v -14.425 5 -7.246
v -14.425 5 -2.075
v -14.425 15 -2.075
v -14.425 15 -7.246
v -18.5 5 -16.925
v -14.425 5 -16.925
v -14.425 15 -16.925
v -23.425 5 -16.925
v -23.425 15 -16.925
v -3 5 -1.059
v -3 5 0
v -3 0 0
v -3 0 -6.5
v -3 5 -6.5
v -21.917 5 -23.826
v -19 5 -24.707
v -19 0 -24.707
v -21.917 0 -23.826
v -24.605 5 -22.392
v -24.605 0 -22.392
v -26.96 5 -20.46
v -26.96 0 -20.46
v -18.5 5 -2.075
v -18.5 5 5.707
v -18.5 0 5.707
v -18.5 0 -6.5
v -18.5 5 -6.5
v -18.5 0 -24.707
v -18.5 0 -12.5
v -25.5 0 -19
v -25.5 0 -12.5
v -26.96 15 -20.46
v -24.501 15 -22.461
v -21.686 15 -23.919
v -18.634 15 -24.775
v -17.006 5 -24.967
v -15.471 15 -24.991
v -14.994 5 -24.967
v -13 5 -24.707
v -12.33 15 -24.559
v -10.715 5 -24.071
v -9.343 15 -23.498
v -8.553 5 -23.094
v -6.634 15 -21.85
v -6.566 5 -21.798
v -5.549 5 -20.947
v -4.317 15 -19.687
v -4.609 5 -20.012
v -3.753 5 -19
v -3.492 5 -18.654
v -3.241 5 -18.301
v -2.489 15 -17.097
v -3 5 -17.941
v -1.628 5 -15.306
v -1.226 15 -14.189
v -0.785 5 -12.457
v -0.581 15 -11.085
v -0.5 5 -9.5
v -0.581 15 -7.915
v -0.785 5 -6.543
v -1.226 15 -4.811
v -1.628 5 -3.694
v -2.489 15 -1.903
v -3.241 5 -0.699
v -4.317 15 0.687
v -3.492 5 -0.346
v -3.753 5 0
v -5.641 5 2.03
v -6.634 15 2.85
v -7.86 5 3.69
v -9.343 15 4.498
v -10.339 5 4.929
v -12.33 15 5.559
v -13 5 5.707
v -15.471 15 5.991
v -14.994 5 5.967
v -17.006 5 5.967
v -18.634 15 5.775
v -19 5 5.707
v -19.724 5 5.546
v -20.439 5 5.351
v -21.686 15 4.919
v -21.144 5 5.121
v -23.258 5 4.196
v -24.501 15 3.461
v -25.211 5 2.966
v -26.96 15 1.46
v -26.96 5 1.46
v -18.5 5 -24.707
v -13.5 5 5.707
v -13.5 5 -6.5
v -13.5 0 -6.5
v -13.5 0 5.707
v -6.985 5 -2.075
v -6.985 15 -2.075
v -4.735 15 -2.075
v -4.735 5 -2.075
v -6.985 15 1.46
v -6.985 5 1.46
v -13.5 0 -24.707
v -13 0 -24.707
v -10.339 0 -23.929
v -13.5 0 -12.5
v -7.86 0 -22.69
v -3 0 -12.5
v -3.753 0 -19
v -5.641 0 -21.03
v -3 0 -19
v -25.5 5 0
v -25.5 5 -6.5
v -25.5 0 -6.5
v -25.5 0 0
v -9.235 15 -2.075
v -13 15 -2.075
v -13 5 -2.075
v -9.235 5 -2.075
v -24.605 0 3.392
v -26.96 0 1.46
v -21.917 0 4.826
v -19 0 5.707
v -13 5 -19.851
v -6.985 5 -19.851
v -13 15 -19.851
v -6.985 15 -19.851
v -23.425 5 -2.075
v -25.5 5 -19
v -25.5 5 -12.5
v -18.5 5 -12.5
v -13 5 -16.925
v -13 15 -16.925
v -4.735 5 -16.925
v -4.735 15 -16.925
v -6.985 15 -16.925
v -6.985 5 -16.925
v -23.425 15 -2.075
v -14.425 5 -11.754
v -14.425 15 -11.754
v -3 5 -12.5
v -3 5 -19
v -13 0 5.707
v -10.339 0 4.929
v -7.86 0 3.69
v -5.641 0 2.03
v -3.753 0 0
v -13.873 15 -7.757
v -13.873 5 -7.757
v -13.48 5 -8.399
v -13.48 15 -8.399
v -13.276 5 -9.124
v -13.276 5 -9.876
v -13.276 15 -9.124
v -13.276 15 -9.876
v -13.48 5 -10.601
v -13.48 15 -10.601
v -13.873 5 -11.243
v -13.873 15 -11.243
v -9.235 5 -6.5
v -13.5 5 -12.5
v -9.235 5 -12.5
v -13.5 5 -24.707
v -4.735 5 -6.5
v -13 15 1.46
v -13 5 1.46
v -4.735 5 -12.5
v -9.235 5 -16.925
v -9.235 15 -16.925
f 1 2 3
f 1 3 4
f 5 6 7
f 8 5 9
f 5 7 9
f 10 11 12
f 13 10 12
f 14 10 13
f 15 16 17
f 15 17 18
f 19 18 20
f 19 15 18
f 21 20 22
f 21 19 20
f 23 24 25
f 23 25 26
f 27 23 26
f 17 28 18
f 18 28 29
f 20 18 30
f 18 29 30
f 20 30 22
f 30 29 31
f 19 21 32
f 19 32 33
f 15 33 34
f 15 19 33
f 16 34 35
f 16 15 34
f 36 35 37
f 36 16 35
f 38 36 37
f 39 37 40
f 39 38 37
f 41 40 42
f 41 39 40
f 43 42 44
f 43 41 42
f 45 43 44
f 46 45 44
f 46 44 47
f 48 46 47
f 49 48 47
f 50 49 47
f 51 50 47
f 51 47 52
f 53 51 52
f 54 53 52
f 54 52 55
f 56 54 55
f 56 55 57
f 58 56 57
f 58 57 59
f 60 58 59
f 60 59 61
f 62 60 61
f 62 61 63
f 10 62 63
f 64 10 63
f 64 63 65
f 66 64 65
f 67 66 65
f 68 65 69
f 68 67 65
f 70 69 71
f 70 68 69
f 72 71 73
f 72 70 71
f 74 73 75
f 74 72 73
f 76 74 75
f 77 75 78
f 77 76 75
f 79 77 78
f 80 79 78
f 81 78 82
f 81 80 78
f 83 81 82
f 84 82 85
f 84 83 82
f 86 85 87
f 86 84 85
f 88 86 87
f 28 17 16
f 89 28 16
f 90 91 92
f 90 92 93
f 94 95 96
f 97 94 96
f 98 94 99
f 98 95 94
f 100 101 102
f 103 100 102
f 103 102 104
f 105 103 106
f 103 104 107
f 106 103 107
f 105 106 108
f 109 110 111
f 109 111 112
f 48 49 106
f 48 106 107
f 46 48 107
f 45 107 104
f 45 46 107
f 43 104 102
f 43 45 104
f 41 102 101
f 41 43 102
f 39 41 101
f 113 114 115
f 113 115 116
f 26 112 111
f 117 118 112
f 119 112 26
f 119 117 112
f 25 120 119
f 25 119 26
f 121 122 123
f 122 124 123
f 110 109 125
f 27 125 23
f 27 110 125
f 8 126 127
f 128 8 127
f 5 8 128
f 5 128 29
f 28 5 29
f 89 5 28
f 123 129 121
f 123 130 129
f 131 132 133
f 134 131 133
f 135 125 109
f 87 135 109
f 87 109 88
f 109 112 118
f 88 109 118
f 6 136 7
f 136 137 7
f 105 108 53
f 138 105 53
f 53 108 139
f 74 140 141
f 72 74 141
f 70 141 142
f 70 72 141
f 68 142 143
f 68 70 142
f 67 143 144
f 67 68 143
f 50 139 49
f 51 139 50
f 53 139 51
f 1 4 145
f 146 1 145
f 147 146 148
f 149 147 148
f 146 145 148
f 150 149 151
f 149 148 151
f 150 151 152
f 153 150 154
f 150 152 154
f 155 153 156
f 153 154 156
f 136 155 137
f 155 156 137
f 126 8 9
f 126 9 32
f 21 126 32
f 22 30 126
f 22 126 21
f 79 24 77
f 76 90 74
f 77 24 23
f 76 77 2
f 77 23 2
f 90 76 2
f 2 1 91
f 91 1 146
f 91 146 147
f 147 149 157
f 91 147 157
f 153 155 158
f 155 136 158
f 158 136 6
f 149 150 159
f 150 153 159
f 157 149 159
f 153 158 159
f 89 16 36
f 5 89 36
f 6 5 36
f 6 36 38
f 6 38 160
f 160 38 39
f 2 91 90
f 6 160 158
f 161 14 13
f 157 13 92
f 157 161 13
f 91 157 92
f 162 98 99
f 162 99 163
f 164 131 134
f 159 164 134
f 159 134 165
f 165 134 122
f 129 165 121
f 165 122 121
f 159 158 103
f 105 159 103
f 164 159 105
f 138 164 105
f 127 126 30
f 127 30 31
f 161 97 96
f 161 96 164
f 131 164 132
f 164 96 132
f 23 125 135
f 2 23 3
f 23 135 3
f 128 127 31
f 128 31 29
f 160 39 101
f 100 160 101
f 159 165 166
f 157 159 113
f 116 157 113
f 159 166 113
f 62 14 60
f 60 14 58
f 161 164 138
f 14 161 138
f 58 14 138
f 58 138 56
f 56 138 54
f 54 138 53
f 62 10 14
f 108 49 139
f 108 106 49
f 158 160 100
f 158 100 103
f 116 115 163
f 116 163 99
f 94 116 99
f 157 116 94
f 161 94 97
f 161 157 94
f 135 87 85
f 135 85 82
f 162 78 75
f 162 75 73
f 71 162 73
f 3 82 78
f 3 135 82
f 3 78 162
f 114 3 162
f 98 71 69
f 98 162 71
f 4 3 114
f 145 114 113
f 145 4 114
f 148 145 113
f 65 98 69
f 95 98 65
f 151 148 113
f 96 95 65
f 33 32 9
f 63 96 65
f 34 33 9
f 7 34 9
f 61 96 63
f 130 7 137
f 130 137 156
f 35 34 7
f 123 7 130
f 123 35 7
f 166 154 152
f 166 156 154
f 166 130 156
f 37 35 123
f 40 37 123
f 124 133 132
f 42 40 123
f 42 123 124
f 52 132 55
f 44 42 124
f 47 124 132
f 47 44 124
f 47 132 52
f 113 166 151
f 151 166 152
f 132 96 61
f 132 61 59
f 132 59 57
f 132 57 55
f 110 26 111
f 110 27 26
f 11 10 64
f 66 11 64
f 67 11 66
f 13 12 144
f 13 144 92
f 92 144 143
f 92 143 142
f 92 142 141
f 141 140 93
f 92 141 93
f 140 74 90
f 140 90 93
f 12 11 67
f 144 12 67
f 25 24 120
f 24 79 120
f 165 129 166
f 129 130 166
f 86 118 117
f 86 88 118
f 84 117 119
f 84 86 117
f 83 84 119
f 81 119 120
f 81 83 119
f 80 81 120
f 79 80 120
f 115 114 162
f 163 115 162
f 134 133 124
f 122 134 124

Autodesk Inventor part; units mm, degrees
ref_plane "YZ Plane" through (0, 0, 0) normal (1, 0, 0) x (0, 1, 0)
ref_plane "XZ Plane" through (0, 0, 0) normal (0, 1, 0) x (-1, 0, 0)
ref_plane "XY Plane" through (0, 0, 0) normal (0, 0, 1) x (1, 0, 0)
sketch "Sketch5" plane through (0, 0, 0) normal (0, 1, 0) x (-1, 0, 0)
  line L0 (0, 0) -> (32, 0)
  line L1 (32, 0) -> (32, -19)
  line L2 (32, -19) -> (0, -19)
  line L3 (0, -19) -> (0, 0)
  line L4 (32, -19) -> (19, -19)
  line L5 (19, -19) -> (19, 0)
  line L6 (19, 0) -> (32, 0)
  line L7 (32, 0) -> (32, -19)
  line L8 (0, 0) -> (13, 0)
  line L9 (13, 0) -> (13, -19)
  line L10 (13, -19) -> (0, -19)
  line L11 (0, -19) -> (0, 0)
  line L12 (0, 0) -> (32, 0)
  line L13 (32, 0) -> (32, -6.75)
  line L14 (32, -6.75) -> (0, -6.75)
  line L15 (0, -6.75) -> (0, 0)
  line L16 (0, -19) -> (32, -19)
  line L17 (32, -19) -> (32, -12.25)
  line L18 (32, -12.25) -> (0, -12.25)
  line L19 (0, -12.25) -> (0, -19)
  circle A0 centre (16, -9.5) radius 4
  circle A1 centre (16, -9.5) radius 1
  line L20 (13, 0) -> (19, 0)
  line L21 (19, 0) -> (19, -19)
  line L22 (19, -19) -> (13, -19)
  line L23 (13, -19) -> (13, 0)
  point P0 (13, -12.1458)
  point P1 (13.0953, -12.25)
  point P2 (0, -12.25)
  point P3 (13, -19)
  point P4 (13.0953, -6.75)
  point P5 (13, -6.8542)
  point P6 (19, -6.8542)
  point P7 (18.9047, -6.75)
  point P8 (19, 0)
  point P9 (18.9047, -12.25)
  point P10 (19, -12.1458)
  point P11 (13, -12.25)
  point P12 (13, -6.75)
  point P13 (19, -6.75)
  point P14 (19, -12.25)
  dimension "d13" = 32
  dimension "d14" = 19
  dimension "d15" = 13
  dimension "d16" = 19
  dimension "d17" = 13
  dimension "d18" = 19
  dimension "d19" = 32
  dimension "d20" = 6.75
  dimension "d21" = 32
  dimension "d22" = 6.75
  dimension "d23" = 8
  dimension "d24" = 2
extrude "Extrusion2" add sketch "Sketch5" along normal blind 5 contours L0 L9 L14 L3 | L0 L5 L14 A0 L9 | L14 L9 A0 L18 L3 | L0 L1 L14 L5 | L14 A0 L9 | L18 L9 L2 L3 | L14 L1 L18 L5 A0 | L5 A0 L14 | L9 A0 | A0 L14 | L18 A0 L5 L2 L9 | L9 A0 L18 | A0 L5 | L18 A0 | L1 L2 L5 L18 | L5 L18 A0
sketch "Sketch6" plane through (0, 5, 0) normal (0, 1, 0) x (1, 0, 0)
  arc A0 (-18.9047, 6.75) -> (-19, 6.8542) centre (-16, 9.5) ccw projected
  circle A1 centre (-16, 9.5) radius 15.5
  line L0 (-16, 9.5) -> (-26.9602, 20.4602)
  line L1 (-16, 9.5) -> (-0.5, 9.5) construction
  line L2 (-16, 9.5) -> (-26.9602, -1.4602)
  line L3 (-16, 9.5) -> (-0.5, 9.5) construction
  line L4 (-26.9602, -1.4602) -> (-19.8891, 5.6109)
  line L5 (-19.8891, 5.6109) -> (-19.8891, 13.3891)
  circle A2 centre (-16, 9.5) radius 1
  point P0 (0, 0)
  dimension "d27" = 31
  dimension "d28" = 135
  dimension "d29" = 135
  dimension "d30" = 10
  dimension "d33" = 2
extrude "Extrusion3" add sketch "Sketch6" along normal blind 10 contours L2 A2 L0 A0 | L2 L5 A0 L0 A2 | A0 L0 A1 L2 | A0 L5 L0
sketch "Sketch7" plane through (0, 15, 0) normal (0, 1, 0) x (1, 0, 0)
  circle A0 centre (-16, 9.5) radius 1 projected
  circle A1 centre (-16, 9.5) radius 2.75
  point P0 (0, 0)
  dimension "d34" = 5.5
extrude "Extrusion4" cut sketch "Sketch7" against normal blind 10
sketch "Sketch8" plane through (0, 0, 0) normal (0, -1, 0) x (1, 0, 0)
  point P0 (0, 0)
sketch "Sketch9" plane through (0, 0, 0) normal (0, -1, 0) x (1, 0, 0)
  arc A0 (-3.7526, -19) -> (-3.7526, 0) centre (-16, -9.5) ccw projected
  point P0 (0, 0)
sketch "Sketch10" plane through (0, 0, 0) normal (0, -1, 0) x (1, 0, 0)
  line L0 (-32, 0) -> (-25.5, 0) projected
  line L1 (-32, 0) -> (-19, 0)
  line L2 (-19, 0) -> (-19, -6)
  line L3 (-19, -6) -> (-32, -6)
  line L4 (-32, -6) -> (-32, 0)
  line L5 (-32, -19) -> (-32, 0) projected
  line L6 (-32, -19) -> (-19, -19)
  line L7 (-19, -19) -> (-19, -13)
  line L8 (-19, -13) -> (-32, -13)
  line L9 (-32, -13) -> (-32, -19)
  line L10 (0, 0) -> (-13, 0)
  line L11 (-13, 0) -> (-13, -6)
  line L12 (-13, -6) -> (0, -6)
  line L13 (0, -6) -> (0, 0)
  line L14 (0, -19) -> (-3.7526, -19) projected
  line L15 (0, -19) -> (-13, -19)
  line L16 (-13, -19) -> (-13, -13)
  line L17 (-13, -13) -> (0, -13)
  line L18 (0, -13) -> (0, -19)
  line L19 (-19, -6) -> (-13, -6)
  line L20 (-13, -6) -> (-13, -13)
  line L21 (-13, -13) -> (-19, -13)
  line L22 (-19, -13) -> (-19, -6)
  line L23 (-19, 0) -> (-13, 0)
  line L24 (-13, 0) -> (-13, -6)
  line L25 (-13, -6) -> (-19, -6)
  line L26 (-19, -6) -> (-19, 0)
  line L27 (-13, -13) -> (-19, -13)
  line L28 (-19, -13) -> (-19, -19)
  line L29 (-19, -19) -> (-13, -19)
  line L30 (-13, -19) -> (-13, -13)
  line L31 (-32, -13) -> (-19, -13)
  line L32 (-19, -13) -> (-19, -6)
  line L33 (-19, -6) -> (-32, -6)
  line L34 (-32, -6) -> (-32, -13)
  line L35 (-13, -6) -> (0, -6)
  line L36 (0, -6) -> (0, -13)
  line L37 (0, -13) -> (-13, -13)
  line L38 (-13, -13) -> (-13, -6)
  point P0 (0, -6)
  dimension "d37" = 13
  dimension "d38" = 6
  dimension "d39" = 6
  dimension "d40" = 13
  dimension "d41" = 6
  dimension "d42" = 13
  dimension "d43" = 6
extrude "Extrusion5" cut sketch "Sketch10" against normal blind 5 contours L3 L22 L8 L5 | L23 L11 L19 L2 | L19 L20 L21 L22 | L12 L36 L17 L20 | L21 L16 L29 L7
sketch "Sketch11" plane through (0, 5, 0) normal (0, -1, 0) x (1, 0, 0)
  arc A0 (-3.7526, 0) -> (-26.9602, 1.4602) centre (-16, -9.5) ccw projected
  arc A1 (-26.9602, -20.4602) -> (-3.7526, -19) centre (-16, -9.5) ccw projected
  line L0 (-25.5, 0) -> (-26.9602, 1.4602) projected
  line L1 (-26.9602, -20.4602) -> (-25.5, -19) projected
  line L2 (-13, 0) -> (-3.7526, 0) projected
  line L3 (-19, -13) -> (-19.8891, -13) projected
  line L4 (-13, -13) -> (-13, -19) projected
  line L5 (-25.5, 0) -> (-19, 0) projected
  line L6 (-25.5, 0) -> (-3.7526, 0)
  line L7 (-19, -19) -> (-32, -19) projected
  line L8 (-19, -19) -> (-19, -13) projected
  line L9 (0, -19) -> (-13, -19) projected
  line L10 (-13, -13) -> (-13, -19) projected
  line L11 (-19.8891, -13.3891) -> (-25.5, -19) projected
  line L12 (-25.5, -19) -> (-3.7526, -19)
  line L13 (-19, 0) -> (-13, 0)
  line L14 (-13, 0) -> (-13, 7)
  line L15 (-13, 7) -> (-19, 7)
  line L16 (-19, 7) -> (-19, 0)
  line L17 (-19, -13) -> (-13, -13)
  line L18 (-13, -13) -> (-13, -25.2796)
  line L19 (-13, -25.2796) -> (-19, -25.2796)
  line L20 (-19, -25.2796) -> (-19, -13)
  point P0 (0, 0)
  point P1 (-19, -24.7069)
  point P2 (-13, -24.7069)
  point P3 (-13, 5.7069)
  point P4 (-19, 5.7069)
  dimension "d47" = 7
extrude "Extrusion6" add sketch "Sketch11" along normal blind 5 contours L2 L14 A0 | L16 L5 L0 A0 | L1 L7 L20 A1 | L18 L9 A1
sketch "Sketch12" plane through (0, 15, 0) normal (0, 1, 0) x (1, 0, 0)
  point P0 (0, 0)
sketch "Sketch14" plane through (0, 0, 0) normal (1, 0, 0) x (0, 0, -1)
  line L0 (0, 5) -> (6, 5) projected
  line L1 (6, 0) -> (6, 5) projected
  line L2 (0, 0) -> (6, 0) projected
  line L3 (0, 0) -> (0, 5) projected
  line L4 (13, 5) -> (13, 0) projected
  line L5 (13, 0) -> (19, 0) projected
  line L6 (19, 0) -> (19, 5) projected
  line L7 (13, 5) -> (19, 5) projected
  line L8 (-5.7069, 0) -> (6, 0) projected
  line L9 (0, 5) -> (6, 5)
  line L10 (6, 5) -> (6, 0)
  line L11 (6, 0) -> (0, 0)
  line L12 (0, 0) -> (0, 5)
  line L13 (13, 0) -> (24.7069, 0) projected
  line L14 (13, 0) -> (19, 0)
  line L15 (19, 0) -> (19, 5)
  line L16 (19, 5) -> (13, 5)
  line L17 (13, 5) -> (13, 0)
extrude "Extrusion8" cut sketch "Sketch14" against normal blind 3
sketch "Sketch16" plane through (-32, 0, -19) normal (-1, 0, 0) x (0, 0, 1)
  line L0 (0, 5) -> (6, 5) projected
  line L1 (0, 0) -> (0, 5) projected
  line L2 (0, 0) -> (6, 0) projected
  line L3 (6, 0) -> (6, 5) projected
  line L4 (13, 0) -> (19, 0) projected
  line L5 (13, 5) -> (13, 0) projected
  line L6 (13, 5) -> (19, 5) projected
  line L7 (19, 0) -> (19, 5) projected
  line L8 (0, 5) -> (0, 0) projected
  line L9 (6, 0) -> (6, 5) projected
  line L10 (0, 5) -> (6, 5)
  line L11 (6, 5) -> (6, 0)
  line L12 (6, 0) -> (0, 0)
  line L13 (0, 0) -> (0, 5)
  line L14 (13, 0) -> (13, 5) projected
  line L15 (19, 0) -> (19, 5) projected
  line L16 (13, 0) -> (19, 0)
  line L17 (19, 0) -> (19, 5)
  line L18 (19, 5) -> (13, 5)
  line L19 (13, 5) -> (13, 0)
extrude "Extrusion9" cut sketch "Sketch16" against normal blind 6.5
sketch "Sketch18" plane through (0, 15, 0) normal (0, 1, 0) x (1, 0, 0)
  line L0 (-19.8891, 5.6109) -> (-26.9602, -1.4602) projected
  line L1 (-26.9602, 20.4602) -> (-19.8891, 13.3891) projected
  line L2 (-23.4246, 2.0754) -> (-14.4246, 2.0754)
  line L3 (-14.4246, 2.0754) -> (-14.4246, 16.9246)
  line L4 (-14.4246, 16.9246) -> (-23.4246, 16.9246)
  line L5 (-23.4246, 16.9246) -> (-23.4246, 2.0754)
  line L6 (-9.2348, 2.0754) -> (-4.7348, 2.0754)
  line L7 (-4.7348, 2.0754) -> (-4.7348, 16.9246)
  line L8 (-4.7348, 16.9246) -> (-9.2348, 16.9246)
  line L9 (-9.2348, 16.9246) -> (-9.2348, 2.0754)
  line L10 (-13, 6) -> (-13, -5.7069) projected
  line L11 (-6.9848, -1.4602) -> (-13, -1.4602)
  line L12 (-13, -1.4602) -> (-13, 2.0754)
  line L13 (-13, 2.0754) -> (-6.9848, 2.0754)
  line L14 (-6.9848, 2.0754) -> (-6.9848, -1.4602)
  line L15 (-13, 13) -> (-13, 24.7069) projected
  line L16 (-6.9848, 19.8513) -> (-13, 19.8513)
  line L17 (-13, 19.8513) -> (-13, 16.9246)
  line L18 (-13, 16.9246) -> (-6.9848, 16.9246)
  line L19 (-6.9848, 16.9246) -> (-6.9848, 19.8513)
  point P0 (0, 0)
  dimension "d79" = 9
  dimension "d80" = 4.5
extrude "Extrusion12" cut sketch "Sketch18" against normal blind 10
sketch "Sketch19" plane through (-13, 0, -6) normal (-1, 0, 0) x (0, 0, 1)
  line L0 (11.7069, 5) -> (11.7069, 0) projected
  line L1 (11.7069, 0) -> (0, 0) projected
  line L2 (11.7069, 5) -> (0, 5)
  line L3 (0, 5) -> (0, 0)
  line L4 (0, 0) -> (11.7069, 0)
  line L5 (11.7069, 0) -> (11.7069, 5)
  line L6 (-7, 0) -> (-7, 5) projected
  line L7 (-7, 0) -> (-18.7069, 0) projected
  line L8 (-18.7069, 5) -> (-18.7069, 0) projected
  line L9 (-7, 5) -> (-10.9246, 5) projected
  line L10 (-7, 5) -> (-18.7069, 5)
  line L11 (-18.7069, 5) -> (-18.7069, 0)
  line L12 (-18.7069, 0) -> (-7, 0)
  line L13 (-7, 0) -> (-7, 5)
  point P0 (6, 0)
sketch "Sketch20" plane through (-19, 0, 5.7069) normal (1, 0, 0) x (0, 0, -1)
  line L0 (11.7069, 0) -> (0, 0) projected
  line L1 (11.7069, 0) -> (11.7069, 5) projected
  line L2 (0, 0) -> (11.7069, 0)
  line L3 (11.7069, 0) -> (11.7069, 5)
  line L4 (11.7069, 5) -> (0, 5)
  line L5 (0, 5) -> (0, 0)
  line L6 (18.7069, 0) -> (18.7069, 5) projected
  line L7 (22.6315, 5) -> (30.4138, 5) projected
  line L8 (18.7069, 0) -> (30.4138, 0)
  line L9 (30.4138, 0) -> (30.4138, 5)
  line L10 (30.4138, 5) -> (18.7069, 5)
  line L11 (18.7069, 5) -> (18.7069, 0)
  point P0 (5.7069, 0)
  point P1 (18.7069, 5)
extrude "Extrusion13" add sketch "Sketch19" along normal blind 0.5
extrude "Extrusion14" add sketch "Sketch20" along normal blind 0.5
sketch "Sketch23" plane through (-3, 0, -13) normal (0, 0, 1) x (1, 0, 0)
  line L0 (0, 5) -> (-1.7348, 5) projected
  line L1 (0, 5) -> (-10.5, 5)
  line L2 (-10.5, 5) -> (-10.5, 0)
  line L3 (-10.5, 0) -> (0, 0)
  line L4 (0, 0) -> (0, 5)
  line L5 (-15.5, 0) -> (-22.5, 0) projected
  line L6 (-22.5, 5) -> (-22.5, 0) projected
  line L7 (-15.5, 0) -> (-22.5, 0)
  line L8 (-22.5, 0) -> (-22.5, 5)
  line L9 (-22.5, 5) -> (-15.5, 5)
  line L10 (-15.5, 5) -> (-15.5, 0)
  point P0 (3, 0)
sketch "Sketch24" plane through (-3, 0, -6) normal (0, 0, -1) x (-1, 0, 0)
  line L0 (0, 0) -> (0, 5) projected
  line L1 (10.5, 5) -> (6.2348, 5) projected
  line L2 (0, 0) -> (10.5, 0)
  line L3 (10.5, 0) -> (10.5, 5)
  line L4 (10.5, 5) -> (0, 5)
  line L5 (0, 5) -> (0, 0)
  line L6 (22.5, 5) -> (15.5, 5) projected
  line L7 (22.5, 0) -> (22.5, 5) projected
  line L8 (15.5, 5) -> (22.5, 5)
  line L9 (22.5, 5) -> (22.5, 0)
  line L10 (22.5, 0) -> (15.5, 0)
  line L11 (15.5, 0) -> (15.5, 5)
  point P0 (-3, 0)
extrude "Extrusion15" add sketch "Sketch24" along normal blind 0.5
extrude "Extrusion16" add sketch "Sketch23" along normal blind 0.5
properties part number "ServoUtmater_3DPrint"
